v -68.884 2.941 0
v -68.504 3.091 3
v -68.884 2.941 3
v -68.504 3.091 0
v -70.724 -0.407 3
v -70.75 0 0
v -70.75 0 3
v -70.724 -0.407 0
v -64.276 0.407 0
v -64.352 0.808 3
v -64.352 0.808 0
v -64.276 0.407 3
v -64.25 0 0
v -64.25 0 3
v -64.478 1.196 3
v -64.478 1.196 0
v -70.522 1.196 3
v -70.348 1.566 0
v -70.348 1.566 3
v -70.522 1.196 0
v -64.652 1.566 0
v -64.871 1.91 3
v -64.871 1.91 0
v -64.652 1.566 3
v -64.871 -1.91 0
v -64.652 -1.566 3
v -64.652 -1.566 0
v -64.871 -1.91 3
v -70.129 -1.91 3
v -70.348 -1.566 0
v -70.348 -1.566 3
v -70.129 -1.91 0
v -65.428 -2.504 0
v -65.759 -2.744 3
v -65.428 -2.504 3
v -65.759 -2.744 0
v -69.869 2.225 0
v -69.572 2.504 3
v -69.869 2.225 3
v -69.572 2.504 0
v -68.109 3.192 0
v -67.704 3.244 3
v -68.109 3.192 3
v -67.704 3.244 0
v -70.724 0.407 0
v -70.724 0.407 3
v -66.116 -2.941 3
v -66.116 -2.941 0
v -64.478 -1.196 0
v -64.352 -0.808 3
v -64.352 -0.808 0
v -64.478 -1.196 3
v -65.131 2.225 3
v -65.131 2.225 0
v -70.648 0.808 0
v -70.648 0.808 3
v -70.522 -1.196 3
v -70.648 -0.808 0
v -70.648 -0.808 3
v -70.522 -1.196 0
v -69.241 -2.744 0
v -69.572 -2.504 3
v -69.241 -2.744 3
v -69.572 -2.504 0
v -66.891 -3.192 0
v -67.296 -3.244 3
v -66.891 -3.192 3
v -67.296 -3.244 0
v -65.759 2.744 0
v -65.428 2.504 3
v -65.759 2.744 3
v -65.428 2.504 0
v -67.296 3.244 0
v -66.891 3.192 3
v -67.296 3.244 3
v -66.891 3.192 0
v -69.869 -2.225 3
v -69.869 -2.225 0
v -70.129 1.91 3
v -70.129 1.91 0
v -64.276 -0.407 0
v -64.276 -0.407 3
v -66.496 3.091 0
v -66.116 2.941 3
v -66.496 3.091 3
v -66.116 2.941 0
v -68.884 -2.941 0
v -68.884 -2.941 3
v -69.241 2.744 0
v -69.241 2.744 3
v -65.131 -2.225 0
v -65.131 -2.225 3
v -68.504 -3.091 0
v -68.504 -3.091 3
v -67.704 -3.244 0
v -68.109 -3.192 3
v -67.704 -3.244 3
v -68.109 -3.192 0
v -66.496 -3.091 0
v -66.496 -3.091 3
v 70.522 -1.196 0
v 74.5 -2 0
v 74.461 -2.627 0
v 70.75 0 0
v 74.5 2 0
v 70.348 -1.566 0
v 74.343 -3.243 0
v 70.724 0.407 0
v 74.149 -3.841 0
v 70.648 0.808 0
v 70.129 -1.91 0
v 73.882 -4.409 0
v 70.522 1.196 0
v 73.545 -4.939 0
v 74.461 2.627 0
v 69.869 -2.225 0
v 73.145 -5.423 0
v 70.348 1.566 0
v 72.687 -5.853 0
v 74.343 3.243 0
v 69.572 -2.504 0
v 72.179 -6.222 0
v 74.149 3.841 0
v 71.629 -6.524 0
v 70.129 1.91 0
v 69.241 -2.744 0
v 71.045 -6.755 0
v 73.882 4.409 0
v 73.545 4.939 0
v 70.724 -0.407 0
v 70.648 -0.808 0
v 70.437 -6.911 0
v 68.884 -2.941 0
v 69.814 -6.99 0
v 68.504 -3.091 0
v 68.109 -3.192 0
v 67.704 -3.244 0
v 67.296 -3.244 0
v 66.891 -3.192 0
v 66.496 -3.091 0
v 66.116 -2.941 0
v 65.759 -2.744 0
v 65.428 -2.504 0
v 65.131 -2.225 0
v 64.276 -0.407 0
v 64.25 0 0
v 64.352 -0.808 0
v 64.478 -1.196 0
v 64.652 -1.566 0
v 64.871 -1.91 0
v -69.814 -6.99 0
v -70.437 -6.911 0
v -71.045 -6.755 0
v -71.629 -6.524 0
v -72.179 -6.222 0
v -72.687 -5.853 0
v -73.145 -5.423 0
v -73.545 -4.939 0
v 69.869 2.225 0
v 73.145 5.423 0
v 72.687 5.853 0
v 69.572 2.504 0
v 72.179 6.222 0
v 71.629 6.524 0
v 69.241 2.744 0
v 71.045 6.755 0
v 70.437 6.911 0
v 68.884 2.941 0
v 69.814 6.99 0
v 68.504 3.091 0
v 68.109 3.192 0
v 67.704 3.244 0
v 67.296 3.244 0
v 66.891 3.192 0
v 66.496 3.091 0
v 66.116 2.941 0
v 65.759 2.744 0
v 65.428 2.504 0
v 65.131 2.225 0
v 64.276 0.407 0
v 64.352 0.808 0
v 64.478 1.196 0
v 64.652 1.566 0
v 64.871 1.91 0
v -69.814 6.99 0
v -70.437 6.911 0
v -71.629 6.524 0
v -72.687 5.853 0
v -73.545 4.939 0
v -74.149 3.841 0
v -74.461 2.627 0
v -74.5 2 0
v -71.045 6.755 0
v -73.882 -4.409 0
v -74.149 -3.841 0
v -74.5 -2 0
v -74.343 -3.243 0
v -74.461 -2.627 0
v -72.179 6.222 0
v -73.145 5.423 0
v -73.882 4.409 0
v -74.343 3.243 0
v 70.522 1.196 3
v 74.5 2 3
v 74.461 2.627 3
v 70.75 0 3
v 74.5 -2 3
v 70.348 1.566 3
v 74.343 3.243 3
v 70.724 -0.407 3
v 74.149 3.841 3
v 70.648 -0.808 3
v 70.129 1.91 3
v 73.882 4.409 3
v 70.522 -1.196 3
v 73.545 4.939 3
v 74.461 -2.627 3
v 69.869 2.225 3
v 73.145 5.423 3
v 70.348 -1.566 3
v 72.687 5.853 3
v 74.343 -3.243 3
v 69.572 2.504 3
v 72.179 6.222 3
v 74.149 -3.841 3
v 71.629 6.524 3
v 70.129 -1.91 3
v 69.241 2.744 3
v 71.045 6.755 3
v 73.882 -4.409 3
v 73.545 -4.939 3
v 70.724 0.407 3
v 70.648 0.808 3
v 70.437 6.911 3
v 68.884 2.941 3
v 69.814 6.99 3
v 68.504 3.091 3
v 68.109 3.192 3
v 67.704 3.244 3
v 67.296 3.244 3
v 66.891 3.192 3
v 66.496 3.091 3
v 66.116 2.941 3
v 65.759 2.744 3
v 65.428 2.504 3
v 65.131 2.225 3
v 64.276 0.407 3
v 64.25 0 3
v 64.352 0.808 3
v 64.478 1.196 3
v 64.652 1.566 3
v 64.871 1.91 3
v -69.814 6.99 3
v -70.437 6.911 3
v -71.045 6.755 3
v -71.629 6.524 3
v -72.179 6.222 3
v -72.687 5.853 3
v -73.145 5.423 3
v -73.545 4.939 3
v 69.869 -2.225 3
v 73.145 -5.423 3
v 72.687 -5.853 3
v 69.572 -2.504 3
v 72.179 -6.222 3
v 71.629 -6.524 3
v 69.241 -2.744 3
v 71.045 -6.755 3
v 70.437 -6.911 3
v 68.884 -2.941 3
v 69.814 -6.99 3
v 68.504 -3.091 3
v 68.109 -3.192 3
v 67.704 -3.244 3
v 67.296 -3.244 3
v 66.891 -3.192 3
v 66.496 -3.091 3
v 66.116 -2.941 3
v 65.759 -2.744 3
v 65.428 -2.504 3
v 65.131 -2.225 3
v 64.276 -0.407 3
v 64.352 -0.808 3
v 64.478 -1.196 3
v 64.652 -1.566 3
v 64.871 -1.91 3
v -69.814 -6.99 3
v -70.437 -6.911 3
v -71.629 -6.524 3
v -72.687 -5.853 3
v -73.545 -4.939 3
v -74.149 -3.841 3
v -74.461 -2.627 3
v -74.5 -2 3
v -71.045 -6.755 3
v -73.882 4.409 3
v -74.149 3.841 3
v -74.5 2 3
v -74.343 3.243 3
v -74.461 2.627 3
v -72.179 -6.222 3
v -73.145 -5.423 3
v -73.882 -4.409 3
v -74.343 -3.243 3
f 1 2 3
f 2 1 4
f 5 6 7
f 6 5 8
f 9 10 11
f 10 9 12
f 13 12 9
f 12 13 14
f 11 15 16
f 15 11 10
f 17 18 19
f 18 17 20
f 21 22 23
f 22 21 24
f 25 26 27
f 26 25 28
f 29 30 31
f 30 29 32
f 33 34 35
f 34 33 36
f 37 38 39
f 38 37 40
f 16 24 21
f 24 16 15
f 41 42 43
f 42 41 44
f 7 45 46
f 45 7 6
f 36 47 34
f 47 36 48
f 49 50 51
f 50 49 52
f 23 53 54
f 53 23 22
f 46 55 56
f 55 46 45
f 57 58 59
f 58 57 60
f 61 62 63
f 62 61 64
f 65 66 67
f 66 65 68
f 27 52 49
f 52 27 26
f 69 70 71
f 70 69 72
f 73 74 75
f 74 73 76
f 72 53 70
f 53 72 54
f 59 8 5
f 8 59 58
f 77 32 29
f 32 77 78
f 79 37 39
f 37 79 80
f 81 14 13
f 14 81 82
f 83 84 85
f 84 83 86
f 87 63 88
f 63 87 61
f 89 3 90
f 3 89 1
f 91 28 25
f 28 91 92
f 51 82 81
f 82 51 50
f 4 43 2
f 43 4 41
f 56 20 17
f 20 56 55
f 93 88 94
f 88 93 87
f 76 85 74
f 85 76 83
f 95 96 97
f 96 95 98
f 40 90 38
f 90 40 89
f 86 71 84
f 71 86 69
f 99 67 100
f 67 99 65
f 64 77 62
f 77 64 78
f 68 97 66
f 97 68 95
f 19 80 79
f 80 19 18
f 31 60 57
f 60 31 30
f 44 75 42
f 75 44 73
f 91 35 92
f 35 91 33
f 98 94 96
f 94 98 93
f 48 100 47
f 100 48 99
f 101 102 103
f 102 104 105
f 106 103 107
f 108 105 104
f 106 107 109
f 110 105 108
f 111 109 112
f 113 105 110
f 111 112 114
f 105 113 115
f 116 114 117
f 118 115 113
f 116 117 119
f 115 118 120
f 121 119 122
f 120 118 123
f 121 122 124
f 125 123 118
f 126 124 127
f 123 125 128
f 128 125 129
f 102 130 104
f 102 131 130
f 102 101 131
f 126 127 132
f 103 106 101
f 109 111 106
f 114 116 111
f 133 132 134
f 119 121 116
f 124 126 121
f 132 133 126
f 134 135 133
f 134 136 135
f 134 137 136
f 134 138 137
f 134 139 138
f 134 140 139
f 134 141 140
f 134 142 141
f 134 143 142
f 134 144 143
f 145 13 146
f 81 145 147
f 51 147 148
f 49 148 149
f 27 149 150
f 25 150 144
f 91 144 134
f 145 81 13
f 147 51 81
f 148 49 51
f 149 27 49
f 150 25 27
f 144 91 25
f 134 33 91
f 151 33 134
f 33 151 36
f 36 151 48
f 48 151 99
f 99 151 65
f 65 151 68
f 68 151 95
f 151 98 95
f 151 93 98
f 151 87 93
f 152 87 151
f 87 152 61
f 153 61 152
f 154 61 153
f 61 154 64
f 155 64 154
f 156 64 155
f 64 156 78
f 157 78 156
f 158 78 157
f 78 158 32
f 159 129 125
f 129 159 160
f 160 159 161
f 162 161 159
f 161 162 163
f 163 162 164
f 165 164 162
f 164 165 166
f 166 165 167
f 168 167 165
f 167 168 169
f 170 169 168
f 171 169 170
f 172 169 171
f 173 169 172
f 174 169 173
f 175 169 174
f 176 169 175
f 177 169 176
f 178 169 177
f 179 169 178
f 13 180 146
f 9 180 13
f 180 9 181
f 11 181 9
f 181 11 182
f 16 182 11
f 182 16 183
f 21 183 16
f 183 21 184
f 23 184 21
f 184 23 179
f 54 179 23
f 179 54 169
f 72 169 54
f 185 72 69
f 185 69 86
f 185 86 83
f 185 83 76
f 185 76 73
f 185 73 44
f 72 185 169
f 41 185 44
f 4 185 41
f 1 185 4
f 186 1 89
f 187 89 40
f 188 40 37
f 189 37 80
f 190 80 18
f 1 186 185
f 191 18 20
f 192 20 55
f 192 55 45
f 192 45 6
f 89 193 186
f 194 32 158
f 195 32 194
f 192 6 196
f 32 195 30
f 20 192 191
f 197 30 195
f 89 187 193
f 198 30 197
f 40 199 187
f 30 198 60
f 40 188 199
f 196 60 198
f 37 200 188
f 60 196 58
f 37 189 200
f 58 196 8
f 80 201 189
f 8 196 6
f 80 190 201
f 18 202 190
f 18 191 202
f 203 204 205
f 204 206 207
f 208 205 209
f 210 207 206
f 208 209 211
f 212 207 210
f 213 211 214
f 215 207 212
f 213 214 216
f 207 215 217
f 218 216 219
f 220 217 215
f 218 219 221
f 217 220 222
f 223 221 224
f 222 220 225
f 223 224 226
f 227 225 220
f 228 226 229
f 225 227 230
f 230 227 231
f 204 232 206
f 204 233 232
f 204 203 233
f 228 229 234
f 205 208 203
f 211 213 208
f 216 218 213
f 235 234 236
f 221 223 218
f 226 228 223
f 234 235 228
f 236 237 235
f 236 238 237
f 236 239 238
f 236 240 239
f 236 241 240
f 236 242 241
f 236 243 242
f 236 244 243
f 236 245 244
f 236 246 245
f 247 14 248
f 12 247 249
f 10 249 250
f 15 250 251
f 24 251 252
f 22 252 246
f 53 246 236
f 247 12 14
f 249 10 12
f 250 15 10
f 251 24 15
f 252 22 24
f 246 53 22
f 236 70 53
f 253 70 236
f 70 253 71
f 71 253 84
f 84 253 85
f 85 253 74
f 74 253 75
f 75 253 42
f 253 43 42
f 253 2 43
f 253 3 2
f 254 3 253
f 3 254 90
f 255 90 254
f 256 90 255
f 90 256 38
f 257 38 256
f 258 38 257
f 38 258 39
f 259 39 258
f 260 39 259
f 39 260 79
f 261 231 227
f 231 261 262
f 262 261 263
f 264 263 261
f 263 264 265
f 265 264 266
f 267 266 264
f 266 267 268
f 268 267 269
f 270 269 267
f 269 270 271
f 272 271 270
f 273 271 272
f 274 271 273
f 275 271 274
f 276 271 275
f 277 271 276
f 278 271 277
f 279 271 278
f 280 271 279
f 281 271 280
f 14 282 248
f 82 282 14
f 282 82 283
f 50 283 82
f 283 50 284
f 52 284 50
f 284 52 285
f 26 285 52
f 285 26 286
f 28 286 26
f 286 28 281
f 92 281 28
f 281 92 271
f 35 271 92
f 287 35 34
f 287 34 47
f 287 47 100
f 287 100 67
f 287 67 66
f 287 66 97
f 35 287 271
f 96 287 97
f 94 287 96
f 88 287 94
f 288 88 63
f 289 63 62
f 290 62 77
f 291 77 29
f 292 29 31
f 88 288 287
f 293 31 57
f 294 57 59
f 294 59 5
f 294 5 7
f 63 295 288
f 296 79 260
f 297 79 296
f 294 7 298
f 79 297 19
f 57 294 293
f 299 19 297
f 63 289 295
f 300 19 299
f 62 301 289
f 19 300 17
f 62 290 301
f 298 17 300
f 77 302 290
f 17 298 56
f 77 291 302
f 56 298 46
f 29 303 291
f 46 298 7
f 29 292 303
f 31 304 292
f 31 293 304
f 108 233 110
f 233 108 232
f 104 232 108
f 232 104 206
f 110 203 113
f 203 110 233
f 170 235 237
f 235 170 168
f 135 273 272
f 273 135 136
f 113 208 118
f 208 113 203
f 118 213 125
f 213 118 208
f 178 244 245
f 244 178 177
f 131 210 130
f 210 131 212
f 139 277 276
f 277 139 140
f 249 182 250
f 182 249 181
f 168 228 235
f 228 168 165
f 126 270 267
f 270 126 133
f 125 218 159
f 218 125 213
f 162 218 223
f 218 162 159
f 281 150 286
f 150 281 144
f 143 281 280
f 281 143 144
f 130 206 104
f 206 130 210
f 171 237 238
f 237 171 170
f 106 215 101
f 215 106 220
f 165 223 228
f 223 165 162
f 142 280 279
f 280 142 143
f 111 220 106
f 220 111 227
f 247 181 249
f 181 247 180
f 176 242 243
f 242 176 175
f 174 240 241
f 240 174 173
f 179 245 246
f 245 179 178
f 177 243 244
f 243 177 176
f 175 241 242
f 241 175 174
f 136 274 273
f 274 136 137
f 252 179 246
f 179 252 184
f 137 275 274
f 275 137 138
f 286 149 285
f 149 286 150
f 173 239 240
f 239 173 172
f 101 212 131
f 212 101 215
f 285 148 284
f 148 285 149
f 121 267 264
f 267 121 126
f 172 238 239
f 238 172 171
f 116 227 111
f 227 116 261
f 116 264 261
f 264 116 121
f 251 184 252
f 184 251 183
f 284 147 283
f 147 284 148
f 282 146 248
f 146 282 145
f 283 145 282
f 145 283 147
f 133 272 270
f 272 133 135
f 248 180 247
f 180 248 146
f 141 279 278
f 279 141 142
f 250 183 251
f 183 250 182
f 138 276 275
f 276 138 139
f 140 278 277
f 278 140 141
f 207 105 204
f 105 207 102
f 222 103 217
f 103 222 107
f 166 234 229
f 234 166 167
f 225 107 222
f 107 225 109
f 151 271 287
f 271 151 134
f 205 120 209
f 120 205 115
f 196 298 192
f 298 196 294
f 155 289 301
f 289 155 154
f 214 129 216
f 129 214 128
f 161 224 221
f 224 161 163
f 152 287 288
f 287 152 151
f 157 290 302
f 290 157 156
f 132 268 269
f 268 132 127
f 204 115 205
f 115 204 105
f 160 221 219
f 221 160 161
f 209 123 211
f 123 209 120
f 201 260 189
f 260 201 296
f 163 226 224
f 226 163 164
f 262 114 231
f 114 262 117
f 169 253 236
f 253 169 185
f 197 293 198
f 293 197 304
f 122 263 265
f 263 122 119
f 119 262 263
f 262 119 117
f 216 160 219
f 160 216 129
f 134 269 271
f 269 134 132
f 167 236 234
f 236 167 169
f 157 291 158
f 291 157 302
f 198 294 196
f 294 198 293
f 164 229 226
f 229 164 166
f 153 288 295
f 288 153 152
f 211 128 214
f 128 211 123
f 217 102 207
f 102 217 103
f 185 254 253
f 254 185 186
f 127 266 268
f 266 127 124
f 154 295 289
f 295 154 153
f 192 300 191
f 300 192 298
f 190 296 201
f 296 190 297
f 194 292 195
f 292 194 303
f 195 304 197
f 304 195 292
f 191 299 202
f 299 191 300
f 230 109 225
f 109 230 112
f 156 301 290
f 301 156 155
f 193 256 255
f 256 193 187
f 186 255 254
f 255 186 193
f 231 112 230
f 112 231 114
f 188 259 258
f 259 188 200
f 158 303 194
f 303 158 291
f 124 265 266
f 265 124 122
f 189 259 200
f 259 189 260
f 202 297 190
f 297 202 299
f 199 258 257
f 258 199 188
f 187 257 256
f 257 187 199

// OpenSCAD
$fn = 50;


difference() {
	union() {
		hull() {
			translate(v = [-69.5000000000, 2.0000000000, 0]) {
				cylinder(h = 3, r = 5);
			}
			translate(v = [69.5000000000, 2.0000000000, 0]) {
				cylinder(h = 3, r = 5);
			}
			translate(v = [-69.5000000000, -2.0000000000, 0]) {
				cylinder(h = 3, r = 5);
			}
			translate(v = [69.5000000000, -2.0000000000, 0]) {
				cylinder(h = 3, r = 5);
			}
		}
	}
	union() {
		translate(v = [-67.5000000000, 0.0000000000, 0]) {
			cylinder(h = 3, r = 3.2500000000);
		}
		translate(v = [67.5000000000, 0.0000000000, 0]) {
			cylinder(h = 3, r = 3.2500000000);
		}
		translate(v = [-67.5000000000, 0.0000000000, 0]) {
			cylinder(h = 3, r = 1.8000000000);
		}
		translate(v = [67.5000000000, 0.0000000000, 0]) {
			cylinder(h = 3, r = 1.8000000000);
		}
		translate(v = [-67.5000000000, 0.0000000000, 0]) {
			cylinder(h = 3, r = 1.8000000000);
		}
		translate(v = [67.5000000000, 0.0000000000, 0]) {
			cylinder(h = 3, r = 1.8000000000);
		}
		translate(v = [-67.5000000000, 0.0000000000, 0]) {
			cylinder(h = 3, r = 1.8000000000);
		}
		translate(v = [67.5000000000, 0.0000000000, 0]) {
			cylinder(h = 3, r = 1.8000000000);
		}
	}
}
